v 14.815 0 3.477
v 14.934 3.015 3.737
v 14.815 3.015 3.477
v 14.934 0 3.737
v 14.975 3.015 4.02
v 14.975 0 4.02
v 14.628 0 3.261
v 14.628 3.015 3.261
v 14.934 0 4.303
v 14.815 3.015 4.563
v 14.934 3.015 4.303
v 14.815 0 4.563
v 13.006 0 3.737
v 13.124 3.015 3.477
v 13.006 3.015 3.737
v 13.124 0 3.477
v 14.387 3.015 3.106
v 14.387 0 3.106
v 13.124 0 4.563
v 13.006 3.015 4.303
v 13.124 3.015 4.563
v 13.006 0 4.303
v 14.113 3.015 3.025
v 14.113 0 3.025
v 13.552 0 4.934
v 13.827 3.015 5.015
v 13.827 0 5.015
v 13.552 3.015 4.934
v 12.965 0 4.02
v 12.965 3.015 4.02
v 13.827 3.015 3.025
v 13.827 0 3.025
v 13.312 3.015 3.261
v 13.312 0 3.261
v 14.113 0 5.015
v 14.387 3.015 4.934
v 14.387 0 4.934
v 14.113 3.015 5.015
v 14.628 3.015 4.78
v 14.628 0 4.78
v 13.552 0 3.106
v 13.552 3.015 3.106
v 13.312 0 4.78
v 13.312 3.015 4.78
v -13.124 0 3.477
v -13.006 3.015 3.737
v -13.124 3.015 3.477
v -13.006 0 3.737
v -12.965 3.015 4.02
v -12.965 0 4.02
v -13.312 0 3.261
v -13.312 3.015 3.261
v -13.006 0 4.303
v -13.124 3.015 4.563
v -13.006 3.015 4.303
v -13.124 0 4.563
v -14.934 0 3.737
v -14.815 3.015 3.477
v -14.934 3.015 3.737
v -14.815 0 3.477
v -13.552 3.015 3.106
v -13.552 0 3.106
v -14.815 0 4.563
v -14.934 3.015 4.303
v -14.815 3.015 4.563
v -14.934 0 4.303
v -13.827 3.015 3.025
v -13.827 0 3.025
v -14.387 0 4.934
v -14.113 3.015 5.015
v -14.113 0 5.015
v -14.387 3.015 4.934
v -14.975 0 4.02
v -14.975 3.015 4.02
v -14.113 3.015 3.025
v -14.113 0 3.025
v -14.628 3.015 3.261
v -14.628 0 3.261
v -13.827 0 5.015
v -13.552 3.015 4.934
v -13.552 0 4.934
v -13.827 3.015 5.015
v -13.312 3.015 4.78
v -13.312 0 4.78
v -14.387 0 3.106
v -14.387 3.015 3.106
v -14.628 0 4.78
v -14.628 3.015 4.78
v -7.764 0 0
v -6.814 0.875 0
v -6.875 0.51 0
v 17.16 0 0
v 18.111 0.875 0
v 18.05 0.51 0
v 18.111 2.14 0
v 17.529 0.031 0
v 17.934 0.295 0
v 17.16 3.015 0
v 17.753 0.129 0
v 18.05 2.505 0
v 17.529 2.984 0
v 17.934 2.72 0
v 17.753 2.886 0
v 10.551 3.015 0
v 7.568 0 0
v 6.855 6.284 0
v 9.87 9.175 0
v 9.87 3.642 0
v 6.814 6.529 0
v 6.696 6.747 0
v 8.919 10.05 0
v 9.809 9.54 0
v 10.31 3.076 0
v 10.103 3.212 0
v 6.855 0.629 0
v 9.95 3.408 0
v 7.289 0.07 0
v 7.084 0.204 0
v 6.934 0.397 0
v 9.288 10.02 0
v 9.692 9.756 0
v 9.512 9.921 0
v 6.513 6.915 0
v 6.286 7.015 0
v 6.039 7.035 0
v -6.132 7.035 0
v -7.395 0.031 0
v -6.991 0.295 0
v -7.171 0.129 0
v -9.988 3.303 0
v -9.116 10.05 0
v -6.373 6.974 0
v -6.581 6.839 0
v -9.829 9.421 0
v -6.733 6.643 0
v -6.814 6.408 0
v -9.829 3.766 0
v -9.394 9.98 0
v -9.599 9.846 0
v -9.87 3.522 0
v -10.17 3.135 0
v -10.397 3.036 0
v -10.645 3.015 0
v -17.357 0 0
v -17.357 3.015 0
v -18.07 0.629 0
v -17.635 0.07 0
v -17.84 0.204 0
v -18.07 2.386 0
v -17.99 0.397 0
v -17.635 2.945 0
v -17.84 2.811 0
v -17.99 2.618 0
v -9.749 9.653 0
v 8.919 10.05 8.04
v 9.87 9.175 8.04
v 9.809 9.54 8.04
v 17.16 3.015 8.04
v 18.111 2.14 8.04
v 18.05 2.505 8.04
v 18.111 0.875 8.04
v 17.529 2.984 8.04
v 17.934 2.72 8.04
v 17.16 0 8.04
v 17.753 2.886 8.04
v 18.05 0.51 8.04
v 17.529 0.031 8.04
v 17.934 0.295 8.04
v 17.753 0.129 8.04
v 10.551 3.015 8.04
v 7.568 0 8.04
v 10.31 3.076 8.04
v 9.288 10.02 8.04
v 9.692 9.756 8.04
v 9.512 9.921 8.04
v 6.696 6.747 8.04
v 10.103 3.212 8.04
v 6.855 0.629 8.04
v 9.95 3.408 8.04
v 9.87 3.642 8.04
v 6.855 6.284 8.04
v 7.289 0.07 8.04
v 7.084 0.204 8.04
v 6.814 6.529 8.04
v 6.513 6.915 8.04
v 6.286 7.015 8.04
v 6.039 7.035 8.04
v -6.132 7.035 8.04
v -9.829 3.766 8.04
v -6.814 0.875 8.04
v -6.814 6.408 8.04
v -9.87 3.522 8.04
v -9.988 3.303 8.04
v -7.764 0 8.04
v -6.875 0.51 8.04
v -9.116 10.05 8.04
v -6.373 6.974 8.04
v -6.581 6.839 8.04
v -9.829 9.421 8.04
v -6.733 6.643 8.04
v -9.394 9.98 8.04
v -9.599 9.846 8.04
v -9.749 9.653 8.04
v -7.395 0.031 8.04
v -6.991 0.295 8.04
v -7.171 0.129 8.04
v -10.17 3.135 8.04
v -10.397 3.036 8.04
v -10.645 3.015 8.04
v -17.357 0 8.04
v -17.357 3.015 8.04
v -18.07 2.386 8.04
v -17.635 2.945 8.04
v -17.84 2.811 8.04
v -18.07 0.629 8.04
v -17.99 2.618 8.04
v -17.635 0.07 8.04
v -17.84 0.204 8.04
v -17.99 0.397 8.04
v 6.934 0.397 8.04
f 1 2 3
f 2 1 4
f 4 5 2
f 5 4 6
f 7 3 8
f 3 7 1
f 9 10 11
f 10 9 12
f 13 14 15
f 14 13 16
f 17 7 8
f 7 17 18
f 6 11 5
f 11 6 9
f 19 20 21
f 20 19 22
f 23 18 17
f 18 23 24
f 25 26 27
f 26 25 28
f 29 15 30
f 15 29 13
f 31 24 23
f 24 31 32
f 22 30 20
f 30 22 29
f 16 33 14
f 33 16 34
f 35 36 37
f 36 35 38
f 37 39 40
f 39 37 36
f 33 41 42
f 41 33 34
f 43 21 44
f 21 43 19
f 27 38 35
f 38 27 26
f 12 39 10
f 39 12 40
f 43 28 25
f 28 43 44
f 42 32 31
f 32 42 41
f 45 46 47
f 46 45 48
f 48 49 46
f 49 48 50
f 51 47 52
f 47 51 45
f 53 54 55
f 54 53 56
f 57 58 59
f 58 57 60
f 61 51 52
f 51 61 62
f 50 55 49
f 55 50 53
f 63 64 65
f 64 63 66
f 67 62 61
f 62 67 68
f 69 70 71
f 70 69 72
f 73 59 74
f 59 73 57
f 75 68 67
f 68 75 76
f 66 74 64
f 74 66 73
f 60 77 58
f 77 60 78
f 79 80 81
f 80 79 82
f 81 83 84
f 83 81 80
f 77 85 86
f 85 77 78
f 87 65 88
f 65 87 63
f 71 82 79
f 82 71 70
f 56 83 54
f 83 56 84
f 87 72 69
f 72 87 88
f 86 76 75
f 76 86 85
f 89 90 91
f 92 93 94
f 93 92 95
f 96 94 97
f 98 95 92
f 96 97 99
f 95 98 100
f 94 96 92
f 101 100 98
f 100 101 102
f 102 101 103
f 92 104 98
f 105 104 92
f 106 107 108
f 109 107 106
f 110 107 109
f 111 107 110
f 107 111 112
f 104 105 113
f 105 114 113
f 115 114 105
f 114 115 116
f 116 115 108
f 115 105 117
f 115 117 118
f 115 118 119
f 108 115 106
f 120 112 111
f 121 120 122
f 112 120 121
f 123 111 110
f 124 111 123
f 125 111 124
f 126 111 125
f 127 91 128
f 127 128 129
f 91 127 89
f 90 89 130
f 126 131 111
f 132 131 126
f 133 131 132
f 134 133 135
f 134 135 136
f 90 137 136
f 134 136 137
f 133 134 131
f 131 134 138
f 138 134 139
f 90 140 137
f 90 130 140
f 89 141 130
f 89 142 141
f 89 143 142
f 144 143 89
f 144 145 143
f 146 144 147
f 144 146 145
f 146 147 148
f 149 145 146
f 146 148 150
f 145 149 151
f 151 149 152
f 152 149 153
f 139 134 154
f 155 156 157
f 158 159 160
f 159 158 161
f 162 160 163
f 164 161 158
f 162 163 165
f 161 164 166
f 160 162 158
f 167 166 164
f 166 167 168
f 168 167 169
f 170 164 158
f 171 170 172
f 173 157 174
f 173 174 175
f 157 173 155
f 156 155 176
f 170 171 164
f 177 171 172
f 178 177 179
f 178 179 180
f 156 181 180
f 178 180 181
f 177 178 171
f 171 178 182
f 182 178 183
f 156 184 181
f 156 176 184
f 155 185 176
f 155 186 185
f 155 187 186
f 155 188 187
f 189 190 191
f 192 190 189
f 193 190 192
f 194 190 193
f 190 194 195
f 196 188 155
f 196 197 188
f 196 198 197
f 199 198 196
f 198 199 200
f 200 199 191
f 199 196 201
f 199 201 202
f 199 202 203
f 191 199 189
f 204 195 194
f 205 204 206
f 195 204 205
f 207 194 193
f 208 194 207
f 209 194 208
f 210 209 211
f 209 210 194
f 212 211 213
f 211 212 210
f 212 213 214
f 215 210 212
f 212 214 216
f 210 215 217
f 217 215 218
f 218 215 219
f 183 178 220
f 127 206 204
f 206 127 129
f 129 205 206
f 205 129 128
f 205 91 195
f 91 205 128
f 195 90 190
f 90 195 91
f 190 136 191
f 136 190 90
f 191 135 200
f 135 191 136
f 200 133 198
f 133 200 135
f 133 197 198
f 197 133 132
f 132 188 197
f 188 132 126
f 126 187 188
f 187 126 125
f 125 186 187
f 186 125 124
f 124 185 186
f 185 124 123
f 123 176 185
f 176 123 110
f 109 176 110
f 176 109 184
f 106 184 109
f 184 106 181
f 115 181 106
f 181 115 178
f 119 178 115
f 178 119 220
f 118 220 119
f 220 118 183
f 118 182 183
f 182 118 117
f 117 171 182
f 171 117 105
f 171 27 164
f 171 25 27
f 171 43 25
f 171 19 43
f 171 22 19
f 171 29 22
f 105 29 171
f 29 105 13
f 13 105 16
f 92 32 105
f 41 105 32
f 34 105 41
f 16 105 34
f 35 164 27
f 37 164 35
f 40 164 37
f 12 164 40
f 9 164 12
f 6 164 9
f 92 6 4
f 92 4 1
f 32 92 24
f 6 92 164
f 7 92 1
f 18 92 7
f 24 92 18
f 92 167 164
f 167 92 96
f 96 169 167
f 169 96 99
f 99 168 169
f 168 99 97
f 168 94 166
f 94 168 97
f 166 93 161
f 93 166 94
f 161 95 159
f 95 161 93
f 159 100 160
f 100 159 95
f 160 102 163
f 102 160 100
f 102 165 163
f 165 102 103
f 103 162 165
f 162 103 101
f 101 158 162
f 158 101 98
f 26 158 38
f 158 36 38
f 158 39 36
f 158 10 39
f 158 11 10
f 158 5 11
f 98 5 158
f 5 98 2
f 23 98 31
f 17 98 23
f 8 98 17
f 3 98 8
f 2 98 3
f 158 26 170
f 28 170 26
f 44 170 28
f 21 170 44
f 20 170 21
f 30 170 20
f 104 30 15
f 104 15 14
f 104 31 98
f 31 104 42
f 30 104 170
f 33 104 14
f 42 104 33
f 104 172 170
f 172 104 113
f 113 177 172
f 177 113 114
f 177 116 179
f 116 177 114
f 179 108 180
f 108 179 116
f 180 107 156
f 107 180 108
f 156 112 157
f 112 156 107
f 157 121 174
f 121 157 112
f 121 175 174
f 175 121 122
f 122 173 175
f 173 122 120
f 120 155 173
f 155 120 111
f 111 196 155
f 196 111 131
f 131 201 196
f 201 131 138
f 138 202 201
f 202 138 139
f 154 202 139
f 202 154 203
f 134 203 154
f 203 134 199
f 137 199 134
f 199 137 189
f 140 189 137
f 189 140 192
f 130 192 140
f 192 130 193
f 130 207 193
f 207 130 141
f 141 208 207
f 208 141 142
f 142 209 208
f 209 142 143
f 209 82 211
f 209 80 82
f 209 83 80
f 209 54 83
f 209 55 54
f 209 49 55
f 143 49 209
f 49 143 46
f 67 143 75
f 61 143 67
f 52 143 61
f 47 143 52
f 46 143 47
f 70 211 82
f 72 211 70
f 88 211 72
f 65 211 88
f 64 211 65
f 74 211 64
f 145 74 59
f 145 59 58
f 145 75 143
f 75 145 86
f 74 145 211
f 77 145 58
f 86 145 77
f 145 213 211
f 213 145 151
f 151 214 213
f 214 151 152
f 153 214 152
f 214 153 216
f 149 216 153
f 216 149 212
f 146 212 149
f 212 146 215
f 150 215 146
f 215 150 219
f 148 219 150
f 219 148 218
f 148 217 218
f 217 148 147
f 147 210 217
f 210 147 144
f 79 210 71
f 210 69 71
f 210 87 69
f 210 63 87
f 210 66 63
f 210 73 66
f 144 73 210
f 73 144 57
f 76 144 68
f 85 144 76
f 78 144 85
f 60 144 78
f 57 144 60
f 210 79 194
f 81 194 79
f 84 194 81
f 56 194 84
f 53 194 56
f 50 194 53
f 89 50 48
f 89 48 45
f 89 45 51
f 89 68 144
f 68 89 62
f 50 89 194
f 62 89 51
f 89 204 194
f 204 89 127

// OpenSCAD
//------------------------------------------------------------------
/*

LED Rope Light Bracket

*/
//------------------------------------------------------------------
/* [Global] */

internal_length = 13.6;
internal_height = 7;
bracket_width = 8;
wall_thickness = 3;
bracket_length = 36;
hole_diameter = 2;

/* [Hidden] */
//------------------------------------------------------------------
// Set the scaling value to compensate for print shrinkage

scale = 1/0.995; // ABS ~0.5% shrinkage
//scale = 1/0.998; // PLA ~0.2% shrinkage

function dim(x) = scale * x;

//------------------------------------------------------------------
// control the number of facets on cylinders

facet_epsilon = 0.01;
function facets(r) = 180 / acos(1 - (facet_epsilon / r));

// small tweak to avoid differencing artifacts
epsilon = 0.05;


//------------------------------------------------------------------
// derived values

internal_l = dim(internal_length);
internal_h = dim(internal_height);
bracket_w = dim(bracket_width);
bracket_l = dim(bracket_length);
wall_t = dim(wall_thickness);
hole_r = dim(hole_diameter/2);

//------------------------------------------------------------------
// rounded/filleted edges

module outset(d=1) {
  minkowski() {
    circle(r=d, $fn=facets(d));
    children(0);
  }
}

module inset(d=1) {
  render() inverse() outset(d=d) inverse() children(0);
}

module inverse() {
  difference() {
    square(1e5, center=true);
    children(0);
  }
}

module rounded(r=1) {
  outset(d=r) inset(d=r) children(0);
}

module filleted(r=1) {
  inset(d=r) render() outset(d=r) children(0);
}

//------------------------------------------------------------------

module hole() {
  translate([0,-epsilon,bracket_w/2]) rotate([-90,0,0]) {
    cylinder(r=hole_r, h=wall_t + (2 * epsilon), $fn=facets(hole_r));
  }
}

module holes() {
  d = ((bracket_l + internal_l) / 4) + (wall_t / 2);
  translate([d,0,0]) hole();
  translate([-d,0,0]) hole();
}

module bracket() {
  points = [
    [internal_l/2, internal_h],
    [internal_l/2, 0],
    [bracket_l/2, 0],
    [bracket_l/2, wall_t],
    [internal_l/2 + wall_t, wall_t],
    [internal_l/2 + wall_t, internal_h + wall_t],
    [-internal_l/2 - wall_t, internal_h + wall_t],
    [-internal_l/2 - wall_t, wall_t],
    [-bracket_l/2, wall_t],
    [-bracket_l/2, 0],
    [-internal_l/2, 0],
    [-internal_l/2, internal_h],
  ];
  linear_extrude(height=bracket_w, convexity=2) {
    filleted(0.25 * wall_t) rounded(0.25 * wall_t) polygon(points=points);
  }
}

difference() {
  bracket();
  holes();
}

//------------------------------------------------------------------
